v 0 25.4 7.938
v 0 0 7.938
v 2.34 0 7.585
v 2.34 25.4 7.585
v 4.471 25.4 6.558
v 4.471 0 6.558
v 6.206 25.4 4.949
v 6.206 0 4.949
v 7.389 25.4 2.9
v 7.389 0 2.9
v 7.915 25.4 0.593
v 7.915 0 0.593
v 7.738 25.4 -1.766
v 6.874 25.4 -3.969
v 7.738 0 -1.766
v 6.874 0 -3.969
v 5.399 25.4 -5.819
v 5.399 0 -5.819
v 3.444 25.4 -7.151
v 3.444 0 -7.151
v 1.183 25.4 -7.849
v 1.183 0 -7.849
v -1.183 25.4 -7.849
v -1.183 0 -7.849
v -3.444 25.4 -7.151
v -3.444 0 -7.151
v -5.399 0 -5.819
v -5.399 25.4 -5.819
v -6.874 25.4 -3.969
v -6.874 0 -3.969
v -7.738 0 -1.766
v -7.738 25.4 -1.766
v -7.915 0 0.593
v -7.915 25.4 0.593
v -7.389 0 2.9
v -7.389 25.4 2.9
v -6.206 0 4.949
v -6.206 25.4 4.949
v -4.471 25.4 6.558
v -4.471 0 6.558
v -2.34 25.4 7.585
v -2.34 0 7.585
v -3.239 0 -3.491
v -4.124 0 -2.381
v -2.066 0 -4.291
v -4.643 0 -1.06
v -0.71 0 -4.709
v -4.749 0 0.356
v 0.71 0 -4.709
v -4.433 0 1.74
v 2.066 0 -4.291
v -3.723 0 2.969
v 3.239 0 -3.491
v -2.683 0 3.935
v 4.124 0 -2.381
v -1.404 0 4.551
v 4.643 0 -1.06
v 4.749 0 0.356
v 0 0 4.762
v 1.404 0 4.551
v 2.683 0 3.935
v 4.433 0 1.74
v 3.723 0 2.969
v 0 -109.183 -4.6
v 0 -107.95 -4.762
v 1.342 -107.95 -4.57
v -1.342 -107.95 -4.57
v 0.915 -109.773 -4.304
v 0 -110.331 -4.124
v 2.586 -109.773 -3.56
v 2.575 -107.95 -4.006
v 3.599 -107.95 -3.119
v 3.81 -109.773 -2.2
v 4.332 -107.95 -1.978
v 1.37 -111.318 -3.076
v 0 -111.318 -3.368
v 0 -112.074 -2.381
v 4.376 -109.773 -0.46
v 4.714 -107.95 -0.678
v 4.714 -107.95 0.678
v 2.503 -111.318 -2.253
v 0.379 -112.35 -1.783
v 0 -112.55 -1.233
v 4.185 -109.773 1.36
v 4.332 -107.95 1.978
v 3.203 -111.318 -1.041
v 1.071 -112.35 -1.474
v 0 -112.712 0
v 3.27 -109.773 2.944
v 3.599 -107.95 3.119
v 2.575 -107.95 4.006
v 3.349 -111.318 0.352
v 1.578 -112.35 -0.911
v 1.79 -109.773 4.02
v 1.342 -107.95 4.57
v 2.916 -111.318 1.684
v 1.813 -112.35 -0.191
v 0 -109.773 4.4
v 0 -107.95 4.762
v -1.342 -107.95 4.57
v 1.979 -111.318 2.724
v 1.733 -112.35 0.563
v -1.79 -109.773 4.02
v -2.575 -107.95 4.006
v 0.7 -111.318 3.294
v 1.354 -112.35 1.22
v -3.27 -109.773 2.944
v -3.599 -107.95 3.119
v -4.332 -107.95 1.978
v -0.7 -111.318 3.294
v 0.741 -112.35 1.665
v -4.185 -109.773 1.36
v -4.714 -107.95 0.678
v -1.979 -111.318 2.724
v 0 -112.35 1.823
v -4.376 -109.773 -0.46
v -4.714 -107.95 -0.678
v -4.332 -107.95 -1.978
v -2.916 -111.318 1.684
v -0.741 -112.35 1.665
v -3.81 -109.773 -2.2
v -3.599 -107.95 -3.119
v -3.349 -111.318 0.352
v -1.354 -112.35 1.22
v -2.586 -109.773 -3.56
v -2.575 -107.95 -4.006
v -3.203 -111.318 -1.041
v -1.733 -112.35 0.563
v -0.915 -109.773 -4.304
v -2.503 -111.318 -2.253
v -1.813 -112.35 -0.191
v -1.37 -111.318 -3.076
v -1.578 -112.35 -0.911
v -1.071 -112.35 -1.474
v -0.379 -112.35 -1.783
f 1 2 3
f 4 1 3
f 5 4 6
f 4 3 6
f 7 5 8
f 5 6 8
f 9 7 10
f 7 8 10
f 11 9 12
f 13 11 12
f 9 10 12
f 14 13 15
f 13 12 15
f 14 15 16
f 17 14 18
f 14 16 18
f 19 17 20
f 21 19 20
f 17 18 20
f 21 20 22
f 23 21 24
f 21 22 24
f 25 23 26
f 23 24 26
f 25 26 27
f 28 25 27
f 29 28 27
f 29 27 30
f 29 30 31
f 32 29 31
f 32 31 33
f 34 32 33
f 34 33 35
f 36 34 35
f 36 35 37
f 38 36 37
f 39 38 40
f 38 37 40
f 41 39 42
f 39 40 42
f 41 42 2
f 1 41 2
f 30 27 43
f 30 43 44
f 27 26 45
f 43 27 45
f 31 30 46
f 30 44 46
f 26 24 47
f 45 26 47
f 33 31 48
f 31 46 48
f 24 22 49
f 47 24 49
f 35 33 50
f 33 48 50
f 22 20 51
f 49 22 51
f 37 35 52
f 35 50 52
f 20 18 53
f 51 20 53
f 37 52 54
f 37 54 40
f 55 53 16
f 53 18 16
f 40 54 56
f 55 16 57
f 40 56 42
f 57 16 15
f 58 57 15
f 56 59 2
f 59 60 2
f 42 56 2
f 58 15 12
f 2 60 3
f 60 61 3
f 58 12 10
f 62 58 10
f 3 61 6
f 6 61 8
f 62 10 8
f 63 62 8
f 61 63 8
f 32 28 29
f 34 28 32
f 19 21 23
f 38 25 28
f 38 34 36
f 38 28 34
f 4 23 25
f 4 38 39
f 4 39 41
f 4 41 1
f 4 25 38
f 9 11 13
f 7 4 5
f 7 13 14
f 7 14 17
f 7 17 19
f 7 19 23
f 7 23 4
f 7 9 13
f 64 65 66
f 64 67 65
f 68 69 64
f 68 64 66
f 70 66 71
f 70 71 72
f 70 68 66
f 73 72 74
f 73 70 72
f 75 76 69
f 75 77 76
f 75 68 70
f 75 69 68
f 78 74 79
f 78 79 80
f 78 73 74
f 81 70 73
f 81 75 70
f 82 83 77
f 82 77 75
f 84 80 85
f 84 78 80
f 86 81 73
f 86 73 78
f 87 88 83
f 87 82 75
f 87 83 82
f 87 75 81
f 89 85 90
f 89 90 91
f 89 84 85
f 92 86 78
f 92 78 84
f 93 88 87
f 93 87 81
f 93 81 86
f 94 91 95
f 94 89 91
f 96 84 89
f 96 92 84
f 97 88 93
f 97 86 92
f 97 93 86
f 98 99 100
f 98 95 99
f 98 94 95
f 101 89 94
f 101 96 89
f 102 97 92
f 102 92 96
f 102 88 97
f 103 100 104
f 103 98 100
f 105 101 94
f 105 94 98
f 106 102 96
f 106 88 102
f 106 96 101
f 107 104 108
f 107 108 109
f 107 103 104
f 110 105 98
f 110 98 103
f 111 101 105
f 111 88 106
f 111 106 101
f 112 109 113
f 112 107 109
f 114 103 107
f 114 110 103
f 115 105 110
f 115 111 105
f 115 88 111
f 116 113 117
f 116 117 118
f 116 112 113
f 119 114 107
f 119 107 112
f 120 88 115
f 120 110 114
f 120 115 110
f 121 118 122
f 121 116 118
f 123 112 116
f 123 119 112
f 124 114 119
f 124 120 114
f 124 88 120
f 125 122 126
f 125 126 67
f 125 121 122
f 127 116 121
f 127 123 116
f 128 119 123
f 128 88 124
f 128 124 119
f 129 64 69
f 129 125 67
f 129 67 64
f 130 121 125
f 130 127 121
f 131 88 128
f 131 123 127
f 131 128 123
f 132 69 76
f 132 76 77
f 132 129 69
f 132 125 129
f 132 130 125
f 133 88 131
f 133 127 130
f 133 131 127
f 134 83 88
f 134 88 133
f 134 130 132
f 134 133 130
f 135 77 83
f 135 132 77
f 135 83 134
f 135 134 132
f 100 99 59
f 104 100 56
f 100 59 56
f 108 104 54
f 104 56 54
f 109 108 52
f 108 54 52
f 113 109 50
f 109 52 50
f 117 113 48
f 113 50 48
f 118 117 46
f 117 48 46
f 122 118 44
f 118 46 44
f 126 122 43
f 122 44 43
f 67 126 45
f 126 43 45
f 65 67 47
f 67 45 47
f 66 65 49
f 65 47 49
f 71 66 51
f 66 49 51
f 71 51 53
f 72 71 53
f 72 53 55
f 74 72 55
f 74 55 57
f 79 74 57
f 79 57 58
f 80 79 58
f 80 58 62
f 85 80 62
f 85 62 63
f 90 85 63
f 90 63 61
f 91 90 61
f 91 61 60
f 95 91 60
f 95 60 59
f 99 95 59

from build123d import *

# Parameters (mm, degrees)
SKETCH1_R           = 7.9375
BOSS_EXTRUDE1_DEPTH = 25.4
SKETCH2_R           = 4.7625
BOSS_EXTRUDE2_DEPTH = 107.95
DOME1_FACE_RADIUS   = 4.7625
DOME1_HEIGHT        = 4.7625


with BuildPart() as part:
    # Sketch1 → Boss-Extrude1 (new body)
    with BuildSketch(Plane(origin=(0, 0, 0), x_dir=(1, 0, 0), z_dir=(0, 1, 0))):
        with Locations(Location((0, 0, 0), (0, 0, 270))):  # turned: the seam where the file's is
            Circle(SKETCH1_R)
    extrude(amount=BOSS_EXTRUDE1_DEPTH)

    # Sketch2 → Boss-Extrude2 (add)
    with BuildSketch(Plane.XZ):
        with Locations(Location((0, 0, 0), (0, 0, 90))):  # turned: the seam where the file's is
            Circle(SKETCH2_R)
    extrude(amount=BOSS_EXTRUDE2_DEPTH)

    # Dome1: a dome of height H over a round flat face of radius A is a cap of a sphere of radius (A * A + H * H) / (2 * H)
    dome1_r = (DOME1_FACE_RADIUS * DOME1_FACE_RADIUS + DOME1_HEIGHT * DOME1_HEIGHT) / (2 * DOME1_HEIGHT)
    dome1_base = Plane((0, -107.95, 0), z_dir=(0, -1, 0))
    with Locations(dome1_base.offset(DOME1_HEIGHT - dome1_r)):
        dome1_ball = Sphere(dome1_r, mode=Mode.PRIVATE)
    add(split(dome1_ball, bisect_by=dome1_base, keep=Keep.TOP, mode=Mode.PRIVATE))


solid = part.part
